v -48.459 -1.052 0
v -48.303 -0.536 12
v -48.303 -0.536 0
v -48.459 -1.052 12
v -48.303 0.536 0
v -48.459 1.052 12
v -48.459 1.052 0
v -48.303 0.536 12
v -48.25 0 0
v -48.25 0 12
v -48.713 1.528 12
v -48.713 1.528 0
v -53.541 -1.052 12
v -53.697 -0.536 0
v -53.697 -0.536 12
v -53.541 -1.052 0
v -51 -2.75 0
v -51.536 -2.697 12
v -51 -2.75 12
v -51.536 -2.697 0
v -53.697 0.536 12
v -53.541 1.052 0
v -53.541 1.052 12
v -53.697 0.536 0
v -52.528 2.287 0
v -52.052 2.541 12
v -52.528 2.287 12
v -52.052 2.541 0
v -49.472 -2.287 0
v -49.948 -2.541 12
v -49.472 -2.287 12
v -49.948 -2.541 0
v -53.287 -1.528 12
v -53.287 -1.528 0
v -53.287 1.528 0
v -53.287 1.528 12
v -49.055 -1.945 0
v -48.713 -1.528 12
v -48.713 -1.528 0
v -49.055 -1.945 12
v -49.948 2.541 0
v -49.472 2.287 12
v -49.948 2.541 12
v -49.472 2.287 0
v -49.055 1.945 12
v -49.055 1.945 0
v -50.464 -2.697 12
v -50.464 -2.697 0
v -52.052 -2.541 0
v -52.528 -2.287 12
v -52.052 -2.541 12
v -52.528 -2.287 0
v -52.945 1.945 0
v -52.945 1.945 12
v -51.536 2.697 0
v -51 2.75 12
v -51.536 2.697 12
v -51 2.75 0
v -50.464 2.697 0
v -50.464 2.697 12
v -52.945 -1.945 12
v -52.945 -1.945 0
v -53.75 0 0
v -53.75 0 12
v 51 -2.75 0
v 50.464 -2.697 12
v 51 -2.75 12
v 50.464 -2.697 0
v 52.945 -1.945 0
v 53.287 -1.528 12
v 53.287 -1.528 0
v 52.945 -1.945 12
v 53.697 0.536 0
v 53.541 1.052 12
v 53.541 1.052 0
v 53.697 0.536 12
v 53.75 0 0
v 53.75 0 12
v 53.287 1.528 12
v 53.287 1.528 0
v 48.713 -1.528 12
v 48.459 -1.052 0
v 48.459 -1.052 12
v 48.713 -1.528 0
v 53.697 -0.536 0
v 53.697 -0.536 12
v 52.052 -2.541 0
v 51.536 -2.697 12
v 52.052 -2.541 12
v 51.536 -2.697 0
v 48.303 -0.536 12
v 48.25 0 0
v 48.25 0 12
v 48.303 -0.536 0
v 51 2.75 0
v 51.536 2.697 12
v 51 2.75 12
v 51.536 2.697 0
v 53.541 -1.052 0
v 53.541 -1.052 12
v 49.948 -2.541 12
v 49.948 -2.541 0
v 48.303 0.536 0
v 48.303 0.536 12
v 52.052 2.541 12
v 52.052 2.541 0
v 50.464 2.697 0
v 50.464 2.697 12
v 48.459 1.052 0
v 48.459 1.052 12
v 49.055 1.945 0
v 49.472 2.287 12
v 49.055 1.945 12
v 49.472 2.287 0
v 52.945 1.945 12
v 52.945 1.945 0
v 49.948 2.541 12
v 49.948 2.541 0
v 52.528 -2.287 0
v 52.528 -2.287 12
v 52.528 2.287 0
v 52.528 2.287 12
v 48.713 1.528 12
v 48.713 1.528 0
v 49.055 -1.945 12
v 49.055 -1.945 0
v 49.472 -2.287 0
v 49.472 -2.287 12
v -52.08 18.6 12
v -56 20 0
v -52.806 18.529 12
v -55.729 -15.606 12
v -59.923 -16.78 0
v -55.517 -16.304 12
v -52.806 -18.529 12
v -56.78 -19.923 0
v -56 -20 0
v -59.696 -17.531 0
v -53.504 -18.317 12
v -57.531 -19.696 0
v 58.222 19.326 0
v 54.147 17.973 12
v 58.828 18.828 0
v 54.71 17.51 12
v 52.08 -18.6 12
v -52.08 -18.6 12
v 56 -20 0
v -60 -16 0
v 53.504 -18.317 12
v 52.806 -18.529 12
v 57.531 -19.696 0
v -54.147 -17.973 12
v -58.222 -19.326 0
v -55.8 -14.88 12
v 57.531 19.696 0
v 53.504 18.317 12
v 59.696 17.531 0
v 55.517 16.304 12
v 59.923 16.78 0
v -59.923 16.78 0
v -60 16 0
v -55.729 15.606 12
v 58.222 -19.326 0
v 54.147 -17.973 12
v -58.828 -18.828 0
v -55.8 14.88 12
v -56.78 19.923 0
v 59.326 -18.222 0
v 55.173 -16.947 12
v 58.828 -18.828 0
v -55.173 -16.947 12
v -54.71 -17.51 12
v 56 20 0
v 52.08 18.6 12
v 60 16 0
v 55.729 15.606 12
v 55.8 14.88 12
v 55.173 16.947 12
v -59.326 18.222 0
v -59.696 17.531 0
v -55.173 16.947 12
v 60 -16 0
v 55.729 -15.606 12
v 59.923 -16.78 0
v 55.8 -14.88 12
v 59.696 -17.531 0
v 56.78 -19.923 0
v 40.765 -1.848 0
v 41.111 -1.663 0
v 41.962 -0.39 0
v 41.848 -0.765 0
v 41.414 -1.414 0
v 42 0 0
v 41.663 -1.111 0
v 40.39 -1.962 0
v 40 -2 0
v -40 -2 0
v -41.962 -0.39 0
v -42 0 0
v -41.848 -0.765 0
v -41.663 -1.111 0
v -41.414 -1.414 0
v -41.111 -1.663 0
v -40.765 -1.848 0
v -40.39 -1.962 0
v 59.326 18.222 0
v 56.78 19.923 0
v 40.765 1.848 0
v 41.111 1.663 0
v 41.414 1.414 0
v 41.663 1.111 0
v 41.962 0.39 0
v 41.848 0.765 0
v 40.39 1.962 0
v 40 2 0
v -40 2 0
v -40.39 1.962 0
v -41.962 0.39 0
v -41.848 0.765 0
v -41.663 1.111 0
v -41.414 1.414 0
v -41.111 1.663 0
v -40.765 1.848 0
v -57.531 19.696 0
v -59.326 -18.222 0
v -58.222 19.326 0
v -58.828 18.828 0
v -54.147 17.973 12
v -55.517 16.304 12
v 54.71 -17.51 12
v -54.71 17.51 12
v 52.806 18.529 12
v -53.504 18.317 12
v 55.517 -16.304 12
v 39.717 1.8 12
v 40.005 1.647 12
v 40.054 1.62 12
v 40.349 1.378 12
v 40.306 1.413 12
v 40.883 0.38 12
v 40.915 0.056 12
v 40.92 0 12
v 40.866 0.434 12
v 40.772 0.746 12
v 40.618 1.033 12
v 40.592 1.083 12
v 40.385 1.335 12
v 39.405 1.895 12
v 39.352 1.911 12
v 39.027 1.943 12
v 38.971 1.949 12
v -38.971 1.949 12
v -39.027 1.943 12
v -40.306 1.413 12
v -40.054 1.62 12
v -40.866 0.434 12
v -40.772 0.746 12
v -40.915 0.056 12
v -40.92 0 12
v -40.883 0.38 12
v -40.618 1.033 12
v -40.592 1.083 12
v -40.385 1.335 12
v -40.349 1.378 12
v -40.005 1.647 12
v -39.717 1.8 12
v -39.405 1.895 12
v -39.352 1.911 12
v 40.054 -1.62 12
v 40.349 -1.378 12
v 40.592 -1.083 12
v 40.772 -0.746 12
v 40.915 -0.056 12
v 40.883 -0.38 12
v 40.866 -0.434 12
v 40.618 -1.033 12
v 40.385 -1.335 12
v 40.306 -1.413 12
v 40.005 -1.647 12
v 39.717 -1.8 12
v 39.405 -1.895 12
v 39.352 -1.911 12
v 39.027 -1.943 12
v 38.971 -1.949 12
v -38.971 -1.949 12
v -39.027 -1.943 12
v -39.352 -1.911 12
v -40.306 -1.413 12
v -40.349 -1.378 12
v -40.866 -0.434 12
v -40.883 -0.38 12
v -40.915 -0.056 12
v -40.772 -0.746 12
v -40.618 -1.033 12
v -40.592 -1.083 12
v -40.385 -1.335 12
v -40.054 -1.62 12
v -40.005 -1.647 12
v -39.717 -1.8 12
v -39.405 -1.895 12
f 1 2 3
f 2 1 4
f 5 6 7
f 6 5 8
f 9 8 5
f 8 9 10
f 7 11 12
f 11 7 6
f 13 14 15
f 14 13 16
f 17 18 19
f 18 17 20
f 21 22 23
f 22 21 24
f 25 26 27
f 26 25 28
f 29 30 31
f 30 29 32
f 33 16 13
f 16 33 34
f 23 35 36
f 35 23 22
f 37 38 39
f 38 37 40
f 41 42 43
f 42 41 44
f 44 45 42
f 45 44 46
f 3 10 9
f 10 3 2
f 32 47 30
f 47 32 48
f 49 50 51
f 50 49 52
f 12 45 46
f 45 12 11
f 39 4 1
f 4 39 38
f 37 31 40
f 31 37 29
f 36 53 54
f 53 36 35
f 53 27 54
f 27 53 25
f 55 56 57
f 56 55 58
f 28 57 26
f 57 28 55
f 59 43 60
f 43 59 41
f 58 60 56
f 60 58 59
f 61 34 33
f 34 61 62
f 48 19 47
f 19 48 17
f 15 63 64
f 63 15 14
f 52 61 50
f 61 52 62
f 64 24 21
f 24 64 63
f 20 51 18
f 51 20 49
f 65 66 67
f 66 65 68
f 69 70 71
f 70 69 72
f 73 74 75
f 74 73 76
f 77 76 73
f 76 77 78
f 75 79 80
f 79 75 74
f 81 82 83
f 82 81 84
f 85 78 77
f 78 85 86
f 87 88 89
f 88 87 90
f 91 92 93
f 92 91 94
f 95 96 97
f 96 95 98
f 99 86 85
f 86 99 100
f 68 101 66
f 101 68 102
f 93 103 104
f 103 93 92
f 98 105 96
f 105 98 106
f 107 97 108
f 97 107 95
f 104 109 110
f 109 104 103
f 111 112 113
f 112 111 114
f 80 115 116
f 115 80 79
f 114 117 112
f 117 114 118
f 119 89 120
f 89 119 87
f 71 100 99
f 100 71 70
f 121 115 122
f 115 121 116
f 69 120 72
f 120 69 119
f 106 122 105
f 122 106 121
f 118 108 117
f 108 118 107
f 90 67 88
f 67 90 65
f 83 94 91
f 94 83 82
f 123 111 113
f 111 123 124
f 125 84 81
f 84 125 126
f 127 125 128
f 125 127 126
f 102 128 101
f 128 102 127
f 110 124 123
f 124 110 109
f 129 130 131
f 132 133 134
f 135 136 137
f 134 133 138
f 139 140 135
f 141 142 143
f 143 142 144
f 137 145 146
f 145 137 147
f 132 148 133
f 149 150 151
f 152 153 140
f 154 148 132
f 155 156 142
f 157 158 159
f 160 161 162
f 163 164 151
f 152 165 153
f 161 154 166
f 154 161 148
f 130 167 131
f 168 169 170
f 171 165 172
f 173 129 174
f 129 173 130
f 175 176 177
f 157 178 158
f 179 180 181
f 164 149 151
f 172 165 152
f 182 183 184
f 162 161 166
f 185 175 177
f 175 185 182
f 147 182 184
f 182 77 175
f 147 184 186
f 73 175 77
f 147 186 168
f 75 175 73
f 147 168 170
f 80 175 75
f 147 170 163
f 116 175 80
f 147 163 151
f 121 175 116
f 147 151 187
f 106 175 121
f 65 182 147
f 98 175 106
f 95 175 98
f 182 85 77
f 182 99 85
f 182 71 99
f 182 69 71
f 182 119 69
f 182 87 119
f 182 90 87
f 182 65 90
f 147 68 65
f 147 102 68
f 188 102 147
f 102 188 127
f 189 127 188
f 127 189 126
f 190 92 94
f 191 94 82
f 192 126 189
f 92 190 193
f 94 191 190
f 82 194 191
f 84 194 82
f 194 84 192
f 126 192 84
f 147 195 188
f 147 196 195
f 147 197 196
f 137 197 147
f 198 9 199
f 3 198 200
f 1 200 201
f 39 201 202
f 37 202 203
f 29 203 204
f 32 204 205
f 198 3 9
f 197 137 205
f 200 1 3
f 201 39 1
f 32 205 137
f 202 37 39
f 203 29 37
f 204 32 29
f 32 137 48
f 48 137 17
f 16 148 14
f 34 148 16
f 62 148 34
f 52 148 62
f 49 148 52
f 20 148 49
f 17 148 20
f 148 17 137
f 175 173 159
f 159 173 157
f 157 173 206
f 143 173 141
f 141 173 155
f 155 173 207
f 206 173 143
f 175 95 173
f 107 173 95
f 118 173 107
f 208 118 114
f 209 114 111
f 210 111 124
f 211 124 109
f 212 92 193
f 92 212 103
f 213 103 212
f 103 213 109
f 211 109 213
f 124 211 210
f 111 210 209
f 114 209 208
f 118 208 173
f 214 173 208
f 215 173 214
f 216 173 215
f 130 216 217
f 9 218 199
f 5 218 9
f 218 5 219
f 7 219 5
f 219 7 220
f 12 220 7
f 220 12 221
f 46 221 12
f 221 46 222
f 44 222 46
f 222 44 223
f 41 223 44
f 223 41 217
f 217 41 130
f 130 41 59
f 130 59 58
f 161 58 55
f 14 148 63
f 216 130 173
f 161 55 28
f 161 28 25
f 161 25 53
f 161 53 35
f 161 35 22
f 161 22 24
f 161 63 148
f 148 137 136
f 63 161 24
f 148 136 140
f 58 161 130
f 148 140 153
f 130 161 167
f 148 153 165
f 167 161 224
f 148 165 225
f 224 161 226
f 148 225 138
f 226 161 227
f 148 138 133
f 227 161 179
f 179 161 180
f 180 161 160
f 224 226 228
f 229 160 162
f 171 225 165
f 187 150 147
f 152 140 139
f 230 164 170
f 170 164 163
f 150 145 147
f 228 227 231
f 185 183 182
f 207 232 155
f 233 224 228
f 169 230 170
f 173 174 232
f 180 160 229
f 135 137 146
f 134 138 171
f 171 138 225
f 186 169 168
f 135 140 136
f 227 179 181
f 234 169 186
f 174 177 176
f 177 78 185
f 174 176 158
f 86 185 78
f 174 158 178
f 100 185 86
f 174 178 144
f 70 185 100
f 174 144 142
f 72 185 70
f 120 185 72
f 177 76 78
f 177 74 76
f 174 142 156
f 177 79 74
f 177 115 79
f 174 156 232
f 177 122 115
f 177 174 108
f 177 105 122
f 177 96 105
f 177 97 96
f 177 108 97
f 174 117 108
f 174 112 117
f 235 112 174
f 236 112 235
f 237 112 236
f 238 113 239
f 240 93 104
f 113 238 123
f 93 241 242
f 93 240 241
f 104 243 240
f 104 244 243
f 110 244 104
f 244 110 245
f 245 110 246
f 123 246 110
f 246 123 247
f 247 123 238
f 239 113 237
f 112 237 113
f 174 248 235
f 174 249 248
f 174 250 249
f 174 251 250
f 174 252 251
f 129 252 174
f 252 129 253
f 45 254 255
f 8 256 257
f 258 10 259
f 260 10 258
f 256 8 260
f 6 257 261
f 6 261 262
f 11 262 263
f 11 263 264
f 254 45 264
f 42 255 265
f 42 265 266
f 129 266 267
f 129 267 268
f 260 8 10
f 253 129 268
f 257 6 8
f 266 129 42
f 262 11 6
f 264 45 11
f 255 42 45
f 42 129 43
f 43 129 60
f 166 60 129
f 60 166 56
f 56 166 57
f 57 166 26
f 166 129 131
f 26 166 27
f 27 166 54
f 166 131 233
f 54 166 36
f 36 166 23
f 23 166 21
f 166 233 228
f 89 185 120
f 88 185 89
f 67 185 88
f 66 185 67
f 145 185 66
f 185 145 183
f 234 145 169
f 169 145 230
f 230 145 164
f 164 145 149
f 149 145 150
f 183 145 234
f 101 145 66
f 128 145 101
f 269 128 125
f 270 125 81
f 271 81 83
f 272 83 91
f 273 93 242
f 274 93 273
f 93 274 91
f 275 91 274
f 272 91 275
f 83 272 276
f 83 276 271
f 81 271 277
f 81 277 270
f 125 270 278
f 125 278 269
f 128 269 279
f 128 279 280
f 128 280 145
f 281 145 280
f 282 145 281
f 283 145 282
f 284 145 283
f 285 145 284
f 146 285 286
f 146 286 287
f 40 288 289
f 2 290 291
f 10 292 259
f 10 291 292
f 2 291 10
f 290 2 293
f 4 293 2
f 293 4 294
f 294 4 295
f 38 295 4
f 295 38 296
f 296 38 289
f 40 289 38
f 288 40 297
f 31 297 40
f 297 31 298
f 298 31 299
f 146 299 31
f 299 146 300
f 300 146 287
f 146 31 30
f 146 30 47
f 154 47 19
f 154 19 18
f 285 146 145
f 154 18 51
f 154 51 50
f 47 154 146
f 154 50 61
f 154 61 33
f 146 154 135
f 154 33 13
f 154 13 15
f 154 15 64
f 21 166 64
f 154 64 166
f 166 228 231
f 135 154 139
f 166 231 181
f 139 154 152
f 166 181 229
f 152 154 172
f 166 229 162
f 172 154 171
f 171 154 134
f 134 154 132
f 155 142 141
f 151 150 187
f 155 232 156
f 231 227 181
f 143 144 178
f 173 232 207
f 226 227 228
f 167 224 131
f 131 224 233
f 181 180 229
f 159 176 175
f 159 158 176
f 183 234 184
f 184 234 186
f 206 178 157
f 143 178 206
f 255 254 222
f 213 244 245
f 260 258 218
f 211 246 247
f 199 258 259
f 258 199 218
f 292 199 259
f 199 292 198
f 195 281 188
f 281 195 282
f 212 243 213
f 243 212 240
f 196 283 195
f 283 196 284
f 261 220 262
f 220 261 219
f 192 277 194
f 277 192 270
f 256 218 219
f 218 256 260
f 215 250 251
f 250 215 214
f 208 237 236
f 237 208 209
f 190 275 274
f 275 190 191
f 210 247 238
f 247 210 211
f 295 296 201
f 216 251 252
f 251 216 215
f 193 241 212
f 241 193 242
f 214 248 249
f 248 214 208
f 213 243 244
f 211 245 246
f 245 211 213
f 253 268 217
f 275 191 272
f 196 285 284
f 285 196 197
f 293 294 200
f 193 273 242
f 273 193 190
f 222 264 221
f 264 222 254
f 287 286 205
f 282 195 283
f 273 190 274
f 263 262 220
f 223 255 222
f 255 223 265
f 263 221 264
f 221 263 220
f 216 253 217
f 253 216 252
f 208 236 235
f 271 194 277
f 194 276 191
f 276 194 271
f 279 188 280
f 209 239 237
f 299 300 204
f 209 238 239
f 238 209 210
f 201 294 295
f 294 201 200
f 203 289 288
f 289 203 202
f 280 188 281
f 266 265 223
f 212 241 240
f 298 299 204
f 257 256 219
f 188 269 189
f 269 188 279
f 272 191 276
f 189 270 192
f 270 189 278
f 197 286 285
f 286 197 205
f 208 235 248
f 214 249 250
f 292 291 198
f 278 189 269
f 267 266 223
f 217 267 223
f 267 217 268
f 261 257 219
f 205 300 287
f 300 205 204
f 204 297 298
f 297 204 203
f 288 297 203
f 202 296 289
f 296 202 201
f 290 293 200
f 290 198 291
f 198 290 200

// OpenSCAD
$fn = 32;

// ----------------------------------------------------------------------
// Display bezel: 120 x 40 mm frame, opening 84x4 mm
// ----------------------------------------------------------------------

// --- parameters (mm) ---
length = 120;             // frame outside length, X
width = 40;               // frame outside width, Y
frame_w = 18;             // frame width
thickness = 12;           // frame thickness
corner_r = 4;             // outside corner radius
chamfer = 0.93;           // outer wall taper
funnel = 0.97;            // inner opening taper
opening_l = 84;           // opening length
opening_w = 4;            // opening width
inner_r = 2;              // opening corner radius
hole_d = 5.5;             // mounting screw clearance
holes_per_side = 1;       // holes per short side
hole_inset = 9;           // hole centre inset from the outside edge

/* rounded-rectangle outlines, generated with loops */
module rounded_ring(l_nom, w_nom, r) {
  hull() {
    for (sx = [-1, 1]) for (sy = [-1, 1])
      translate([sx * (l_nom / 2 - r), sy * (w_nom / 2 - r)]) circle(r = r);
  }
}

difference() {
  /* frame body, drafted so the outer edge is a variable-depth chamfer */
  linear_extrude(height = thickness, scale = chamfer)
    rounded_ring(length, width, corner_r);
  /* viewing opening, drafted the other way for a funnel edge */
  linear_extrude(height = thickness + 2, scale = funnel)
    translate([0, 0, -1]) rounded_ring(opening_l, opening_w, inner_r);
  /* mounting screws through the frame lands */
  for (sx = [-1, 1]) for (i = [1 : holes_per_side])
    translate([sx * (length / 2 - hole_inset),
               (i - (holes_per_side + 1) / 2) * width * 0.5, -1])
      cylinder(h = thickness + 2, d = hole_d);
}
